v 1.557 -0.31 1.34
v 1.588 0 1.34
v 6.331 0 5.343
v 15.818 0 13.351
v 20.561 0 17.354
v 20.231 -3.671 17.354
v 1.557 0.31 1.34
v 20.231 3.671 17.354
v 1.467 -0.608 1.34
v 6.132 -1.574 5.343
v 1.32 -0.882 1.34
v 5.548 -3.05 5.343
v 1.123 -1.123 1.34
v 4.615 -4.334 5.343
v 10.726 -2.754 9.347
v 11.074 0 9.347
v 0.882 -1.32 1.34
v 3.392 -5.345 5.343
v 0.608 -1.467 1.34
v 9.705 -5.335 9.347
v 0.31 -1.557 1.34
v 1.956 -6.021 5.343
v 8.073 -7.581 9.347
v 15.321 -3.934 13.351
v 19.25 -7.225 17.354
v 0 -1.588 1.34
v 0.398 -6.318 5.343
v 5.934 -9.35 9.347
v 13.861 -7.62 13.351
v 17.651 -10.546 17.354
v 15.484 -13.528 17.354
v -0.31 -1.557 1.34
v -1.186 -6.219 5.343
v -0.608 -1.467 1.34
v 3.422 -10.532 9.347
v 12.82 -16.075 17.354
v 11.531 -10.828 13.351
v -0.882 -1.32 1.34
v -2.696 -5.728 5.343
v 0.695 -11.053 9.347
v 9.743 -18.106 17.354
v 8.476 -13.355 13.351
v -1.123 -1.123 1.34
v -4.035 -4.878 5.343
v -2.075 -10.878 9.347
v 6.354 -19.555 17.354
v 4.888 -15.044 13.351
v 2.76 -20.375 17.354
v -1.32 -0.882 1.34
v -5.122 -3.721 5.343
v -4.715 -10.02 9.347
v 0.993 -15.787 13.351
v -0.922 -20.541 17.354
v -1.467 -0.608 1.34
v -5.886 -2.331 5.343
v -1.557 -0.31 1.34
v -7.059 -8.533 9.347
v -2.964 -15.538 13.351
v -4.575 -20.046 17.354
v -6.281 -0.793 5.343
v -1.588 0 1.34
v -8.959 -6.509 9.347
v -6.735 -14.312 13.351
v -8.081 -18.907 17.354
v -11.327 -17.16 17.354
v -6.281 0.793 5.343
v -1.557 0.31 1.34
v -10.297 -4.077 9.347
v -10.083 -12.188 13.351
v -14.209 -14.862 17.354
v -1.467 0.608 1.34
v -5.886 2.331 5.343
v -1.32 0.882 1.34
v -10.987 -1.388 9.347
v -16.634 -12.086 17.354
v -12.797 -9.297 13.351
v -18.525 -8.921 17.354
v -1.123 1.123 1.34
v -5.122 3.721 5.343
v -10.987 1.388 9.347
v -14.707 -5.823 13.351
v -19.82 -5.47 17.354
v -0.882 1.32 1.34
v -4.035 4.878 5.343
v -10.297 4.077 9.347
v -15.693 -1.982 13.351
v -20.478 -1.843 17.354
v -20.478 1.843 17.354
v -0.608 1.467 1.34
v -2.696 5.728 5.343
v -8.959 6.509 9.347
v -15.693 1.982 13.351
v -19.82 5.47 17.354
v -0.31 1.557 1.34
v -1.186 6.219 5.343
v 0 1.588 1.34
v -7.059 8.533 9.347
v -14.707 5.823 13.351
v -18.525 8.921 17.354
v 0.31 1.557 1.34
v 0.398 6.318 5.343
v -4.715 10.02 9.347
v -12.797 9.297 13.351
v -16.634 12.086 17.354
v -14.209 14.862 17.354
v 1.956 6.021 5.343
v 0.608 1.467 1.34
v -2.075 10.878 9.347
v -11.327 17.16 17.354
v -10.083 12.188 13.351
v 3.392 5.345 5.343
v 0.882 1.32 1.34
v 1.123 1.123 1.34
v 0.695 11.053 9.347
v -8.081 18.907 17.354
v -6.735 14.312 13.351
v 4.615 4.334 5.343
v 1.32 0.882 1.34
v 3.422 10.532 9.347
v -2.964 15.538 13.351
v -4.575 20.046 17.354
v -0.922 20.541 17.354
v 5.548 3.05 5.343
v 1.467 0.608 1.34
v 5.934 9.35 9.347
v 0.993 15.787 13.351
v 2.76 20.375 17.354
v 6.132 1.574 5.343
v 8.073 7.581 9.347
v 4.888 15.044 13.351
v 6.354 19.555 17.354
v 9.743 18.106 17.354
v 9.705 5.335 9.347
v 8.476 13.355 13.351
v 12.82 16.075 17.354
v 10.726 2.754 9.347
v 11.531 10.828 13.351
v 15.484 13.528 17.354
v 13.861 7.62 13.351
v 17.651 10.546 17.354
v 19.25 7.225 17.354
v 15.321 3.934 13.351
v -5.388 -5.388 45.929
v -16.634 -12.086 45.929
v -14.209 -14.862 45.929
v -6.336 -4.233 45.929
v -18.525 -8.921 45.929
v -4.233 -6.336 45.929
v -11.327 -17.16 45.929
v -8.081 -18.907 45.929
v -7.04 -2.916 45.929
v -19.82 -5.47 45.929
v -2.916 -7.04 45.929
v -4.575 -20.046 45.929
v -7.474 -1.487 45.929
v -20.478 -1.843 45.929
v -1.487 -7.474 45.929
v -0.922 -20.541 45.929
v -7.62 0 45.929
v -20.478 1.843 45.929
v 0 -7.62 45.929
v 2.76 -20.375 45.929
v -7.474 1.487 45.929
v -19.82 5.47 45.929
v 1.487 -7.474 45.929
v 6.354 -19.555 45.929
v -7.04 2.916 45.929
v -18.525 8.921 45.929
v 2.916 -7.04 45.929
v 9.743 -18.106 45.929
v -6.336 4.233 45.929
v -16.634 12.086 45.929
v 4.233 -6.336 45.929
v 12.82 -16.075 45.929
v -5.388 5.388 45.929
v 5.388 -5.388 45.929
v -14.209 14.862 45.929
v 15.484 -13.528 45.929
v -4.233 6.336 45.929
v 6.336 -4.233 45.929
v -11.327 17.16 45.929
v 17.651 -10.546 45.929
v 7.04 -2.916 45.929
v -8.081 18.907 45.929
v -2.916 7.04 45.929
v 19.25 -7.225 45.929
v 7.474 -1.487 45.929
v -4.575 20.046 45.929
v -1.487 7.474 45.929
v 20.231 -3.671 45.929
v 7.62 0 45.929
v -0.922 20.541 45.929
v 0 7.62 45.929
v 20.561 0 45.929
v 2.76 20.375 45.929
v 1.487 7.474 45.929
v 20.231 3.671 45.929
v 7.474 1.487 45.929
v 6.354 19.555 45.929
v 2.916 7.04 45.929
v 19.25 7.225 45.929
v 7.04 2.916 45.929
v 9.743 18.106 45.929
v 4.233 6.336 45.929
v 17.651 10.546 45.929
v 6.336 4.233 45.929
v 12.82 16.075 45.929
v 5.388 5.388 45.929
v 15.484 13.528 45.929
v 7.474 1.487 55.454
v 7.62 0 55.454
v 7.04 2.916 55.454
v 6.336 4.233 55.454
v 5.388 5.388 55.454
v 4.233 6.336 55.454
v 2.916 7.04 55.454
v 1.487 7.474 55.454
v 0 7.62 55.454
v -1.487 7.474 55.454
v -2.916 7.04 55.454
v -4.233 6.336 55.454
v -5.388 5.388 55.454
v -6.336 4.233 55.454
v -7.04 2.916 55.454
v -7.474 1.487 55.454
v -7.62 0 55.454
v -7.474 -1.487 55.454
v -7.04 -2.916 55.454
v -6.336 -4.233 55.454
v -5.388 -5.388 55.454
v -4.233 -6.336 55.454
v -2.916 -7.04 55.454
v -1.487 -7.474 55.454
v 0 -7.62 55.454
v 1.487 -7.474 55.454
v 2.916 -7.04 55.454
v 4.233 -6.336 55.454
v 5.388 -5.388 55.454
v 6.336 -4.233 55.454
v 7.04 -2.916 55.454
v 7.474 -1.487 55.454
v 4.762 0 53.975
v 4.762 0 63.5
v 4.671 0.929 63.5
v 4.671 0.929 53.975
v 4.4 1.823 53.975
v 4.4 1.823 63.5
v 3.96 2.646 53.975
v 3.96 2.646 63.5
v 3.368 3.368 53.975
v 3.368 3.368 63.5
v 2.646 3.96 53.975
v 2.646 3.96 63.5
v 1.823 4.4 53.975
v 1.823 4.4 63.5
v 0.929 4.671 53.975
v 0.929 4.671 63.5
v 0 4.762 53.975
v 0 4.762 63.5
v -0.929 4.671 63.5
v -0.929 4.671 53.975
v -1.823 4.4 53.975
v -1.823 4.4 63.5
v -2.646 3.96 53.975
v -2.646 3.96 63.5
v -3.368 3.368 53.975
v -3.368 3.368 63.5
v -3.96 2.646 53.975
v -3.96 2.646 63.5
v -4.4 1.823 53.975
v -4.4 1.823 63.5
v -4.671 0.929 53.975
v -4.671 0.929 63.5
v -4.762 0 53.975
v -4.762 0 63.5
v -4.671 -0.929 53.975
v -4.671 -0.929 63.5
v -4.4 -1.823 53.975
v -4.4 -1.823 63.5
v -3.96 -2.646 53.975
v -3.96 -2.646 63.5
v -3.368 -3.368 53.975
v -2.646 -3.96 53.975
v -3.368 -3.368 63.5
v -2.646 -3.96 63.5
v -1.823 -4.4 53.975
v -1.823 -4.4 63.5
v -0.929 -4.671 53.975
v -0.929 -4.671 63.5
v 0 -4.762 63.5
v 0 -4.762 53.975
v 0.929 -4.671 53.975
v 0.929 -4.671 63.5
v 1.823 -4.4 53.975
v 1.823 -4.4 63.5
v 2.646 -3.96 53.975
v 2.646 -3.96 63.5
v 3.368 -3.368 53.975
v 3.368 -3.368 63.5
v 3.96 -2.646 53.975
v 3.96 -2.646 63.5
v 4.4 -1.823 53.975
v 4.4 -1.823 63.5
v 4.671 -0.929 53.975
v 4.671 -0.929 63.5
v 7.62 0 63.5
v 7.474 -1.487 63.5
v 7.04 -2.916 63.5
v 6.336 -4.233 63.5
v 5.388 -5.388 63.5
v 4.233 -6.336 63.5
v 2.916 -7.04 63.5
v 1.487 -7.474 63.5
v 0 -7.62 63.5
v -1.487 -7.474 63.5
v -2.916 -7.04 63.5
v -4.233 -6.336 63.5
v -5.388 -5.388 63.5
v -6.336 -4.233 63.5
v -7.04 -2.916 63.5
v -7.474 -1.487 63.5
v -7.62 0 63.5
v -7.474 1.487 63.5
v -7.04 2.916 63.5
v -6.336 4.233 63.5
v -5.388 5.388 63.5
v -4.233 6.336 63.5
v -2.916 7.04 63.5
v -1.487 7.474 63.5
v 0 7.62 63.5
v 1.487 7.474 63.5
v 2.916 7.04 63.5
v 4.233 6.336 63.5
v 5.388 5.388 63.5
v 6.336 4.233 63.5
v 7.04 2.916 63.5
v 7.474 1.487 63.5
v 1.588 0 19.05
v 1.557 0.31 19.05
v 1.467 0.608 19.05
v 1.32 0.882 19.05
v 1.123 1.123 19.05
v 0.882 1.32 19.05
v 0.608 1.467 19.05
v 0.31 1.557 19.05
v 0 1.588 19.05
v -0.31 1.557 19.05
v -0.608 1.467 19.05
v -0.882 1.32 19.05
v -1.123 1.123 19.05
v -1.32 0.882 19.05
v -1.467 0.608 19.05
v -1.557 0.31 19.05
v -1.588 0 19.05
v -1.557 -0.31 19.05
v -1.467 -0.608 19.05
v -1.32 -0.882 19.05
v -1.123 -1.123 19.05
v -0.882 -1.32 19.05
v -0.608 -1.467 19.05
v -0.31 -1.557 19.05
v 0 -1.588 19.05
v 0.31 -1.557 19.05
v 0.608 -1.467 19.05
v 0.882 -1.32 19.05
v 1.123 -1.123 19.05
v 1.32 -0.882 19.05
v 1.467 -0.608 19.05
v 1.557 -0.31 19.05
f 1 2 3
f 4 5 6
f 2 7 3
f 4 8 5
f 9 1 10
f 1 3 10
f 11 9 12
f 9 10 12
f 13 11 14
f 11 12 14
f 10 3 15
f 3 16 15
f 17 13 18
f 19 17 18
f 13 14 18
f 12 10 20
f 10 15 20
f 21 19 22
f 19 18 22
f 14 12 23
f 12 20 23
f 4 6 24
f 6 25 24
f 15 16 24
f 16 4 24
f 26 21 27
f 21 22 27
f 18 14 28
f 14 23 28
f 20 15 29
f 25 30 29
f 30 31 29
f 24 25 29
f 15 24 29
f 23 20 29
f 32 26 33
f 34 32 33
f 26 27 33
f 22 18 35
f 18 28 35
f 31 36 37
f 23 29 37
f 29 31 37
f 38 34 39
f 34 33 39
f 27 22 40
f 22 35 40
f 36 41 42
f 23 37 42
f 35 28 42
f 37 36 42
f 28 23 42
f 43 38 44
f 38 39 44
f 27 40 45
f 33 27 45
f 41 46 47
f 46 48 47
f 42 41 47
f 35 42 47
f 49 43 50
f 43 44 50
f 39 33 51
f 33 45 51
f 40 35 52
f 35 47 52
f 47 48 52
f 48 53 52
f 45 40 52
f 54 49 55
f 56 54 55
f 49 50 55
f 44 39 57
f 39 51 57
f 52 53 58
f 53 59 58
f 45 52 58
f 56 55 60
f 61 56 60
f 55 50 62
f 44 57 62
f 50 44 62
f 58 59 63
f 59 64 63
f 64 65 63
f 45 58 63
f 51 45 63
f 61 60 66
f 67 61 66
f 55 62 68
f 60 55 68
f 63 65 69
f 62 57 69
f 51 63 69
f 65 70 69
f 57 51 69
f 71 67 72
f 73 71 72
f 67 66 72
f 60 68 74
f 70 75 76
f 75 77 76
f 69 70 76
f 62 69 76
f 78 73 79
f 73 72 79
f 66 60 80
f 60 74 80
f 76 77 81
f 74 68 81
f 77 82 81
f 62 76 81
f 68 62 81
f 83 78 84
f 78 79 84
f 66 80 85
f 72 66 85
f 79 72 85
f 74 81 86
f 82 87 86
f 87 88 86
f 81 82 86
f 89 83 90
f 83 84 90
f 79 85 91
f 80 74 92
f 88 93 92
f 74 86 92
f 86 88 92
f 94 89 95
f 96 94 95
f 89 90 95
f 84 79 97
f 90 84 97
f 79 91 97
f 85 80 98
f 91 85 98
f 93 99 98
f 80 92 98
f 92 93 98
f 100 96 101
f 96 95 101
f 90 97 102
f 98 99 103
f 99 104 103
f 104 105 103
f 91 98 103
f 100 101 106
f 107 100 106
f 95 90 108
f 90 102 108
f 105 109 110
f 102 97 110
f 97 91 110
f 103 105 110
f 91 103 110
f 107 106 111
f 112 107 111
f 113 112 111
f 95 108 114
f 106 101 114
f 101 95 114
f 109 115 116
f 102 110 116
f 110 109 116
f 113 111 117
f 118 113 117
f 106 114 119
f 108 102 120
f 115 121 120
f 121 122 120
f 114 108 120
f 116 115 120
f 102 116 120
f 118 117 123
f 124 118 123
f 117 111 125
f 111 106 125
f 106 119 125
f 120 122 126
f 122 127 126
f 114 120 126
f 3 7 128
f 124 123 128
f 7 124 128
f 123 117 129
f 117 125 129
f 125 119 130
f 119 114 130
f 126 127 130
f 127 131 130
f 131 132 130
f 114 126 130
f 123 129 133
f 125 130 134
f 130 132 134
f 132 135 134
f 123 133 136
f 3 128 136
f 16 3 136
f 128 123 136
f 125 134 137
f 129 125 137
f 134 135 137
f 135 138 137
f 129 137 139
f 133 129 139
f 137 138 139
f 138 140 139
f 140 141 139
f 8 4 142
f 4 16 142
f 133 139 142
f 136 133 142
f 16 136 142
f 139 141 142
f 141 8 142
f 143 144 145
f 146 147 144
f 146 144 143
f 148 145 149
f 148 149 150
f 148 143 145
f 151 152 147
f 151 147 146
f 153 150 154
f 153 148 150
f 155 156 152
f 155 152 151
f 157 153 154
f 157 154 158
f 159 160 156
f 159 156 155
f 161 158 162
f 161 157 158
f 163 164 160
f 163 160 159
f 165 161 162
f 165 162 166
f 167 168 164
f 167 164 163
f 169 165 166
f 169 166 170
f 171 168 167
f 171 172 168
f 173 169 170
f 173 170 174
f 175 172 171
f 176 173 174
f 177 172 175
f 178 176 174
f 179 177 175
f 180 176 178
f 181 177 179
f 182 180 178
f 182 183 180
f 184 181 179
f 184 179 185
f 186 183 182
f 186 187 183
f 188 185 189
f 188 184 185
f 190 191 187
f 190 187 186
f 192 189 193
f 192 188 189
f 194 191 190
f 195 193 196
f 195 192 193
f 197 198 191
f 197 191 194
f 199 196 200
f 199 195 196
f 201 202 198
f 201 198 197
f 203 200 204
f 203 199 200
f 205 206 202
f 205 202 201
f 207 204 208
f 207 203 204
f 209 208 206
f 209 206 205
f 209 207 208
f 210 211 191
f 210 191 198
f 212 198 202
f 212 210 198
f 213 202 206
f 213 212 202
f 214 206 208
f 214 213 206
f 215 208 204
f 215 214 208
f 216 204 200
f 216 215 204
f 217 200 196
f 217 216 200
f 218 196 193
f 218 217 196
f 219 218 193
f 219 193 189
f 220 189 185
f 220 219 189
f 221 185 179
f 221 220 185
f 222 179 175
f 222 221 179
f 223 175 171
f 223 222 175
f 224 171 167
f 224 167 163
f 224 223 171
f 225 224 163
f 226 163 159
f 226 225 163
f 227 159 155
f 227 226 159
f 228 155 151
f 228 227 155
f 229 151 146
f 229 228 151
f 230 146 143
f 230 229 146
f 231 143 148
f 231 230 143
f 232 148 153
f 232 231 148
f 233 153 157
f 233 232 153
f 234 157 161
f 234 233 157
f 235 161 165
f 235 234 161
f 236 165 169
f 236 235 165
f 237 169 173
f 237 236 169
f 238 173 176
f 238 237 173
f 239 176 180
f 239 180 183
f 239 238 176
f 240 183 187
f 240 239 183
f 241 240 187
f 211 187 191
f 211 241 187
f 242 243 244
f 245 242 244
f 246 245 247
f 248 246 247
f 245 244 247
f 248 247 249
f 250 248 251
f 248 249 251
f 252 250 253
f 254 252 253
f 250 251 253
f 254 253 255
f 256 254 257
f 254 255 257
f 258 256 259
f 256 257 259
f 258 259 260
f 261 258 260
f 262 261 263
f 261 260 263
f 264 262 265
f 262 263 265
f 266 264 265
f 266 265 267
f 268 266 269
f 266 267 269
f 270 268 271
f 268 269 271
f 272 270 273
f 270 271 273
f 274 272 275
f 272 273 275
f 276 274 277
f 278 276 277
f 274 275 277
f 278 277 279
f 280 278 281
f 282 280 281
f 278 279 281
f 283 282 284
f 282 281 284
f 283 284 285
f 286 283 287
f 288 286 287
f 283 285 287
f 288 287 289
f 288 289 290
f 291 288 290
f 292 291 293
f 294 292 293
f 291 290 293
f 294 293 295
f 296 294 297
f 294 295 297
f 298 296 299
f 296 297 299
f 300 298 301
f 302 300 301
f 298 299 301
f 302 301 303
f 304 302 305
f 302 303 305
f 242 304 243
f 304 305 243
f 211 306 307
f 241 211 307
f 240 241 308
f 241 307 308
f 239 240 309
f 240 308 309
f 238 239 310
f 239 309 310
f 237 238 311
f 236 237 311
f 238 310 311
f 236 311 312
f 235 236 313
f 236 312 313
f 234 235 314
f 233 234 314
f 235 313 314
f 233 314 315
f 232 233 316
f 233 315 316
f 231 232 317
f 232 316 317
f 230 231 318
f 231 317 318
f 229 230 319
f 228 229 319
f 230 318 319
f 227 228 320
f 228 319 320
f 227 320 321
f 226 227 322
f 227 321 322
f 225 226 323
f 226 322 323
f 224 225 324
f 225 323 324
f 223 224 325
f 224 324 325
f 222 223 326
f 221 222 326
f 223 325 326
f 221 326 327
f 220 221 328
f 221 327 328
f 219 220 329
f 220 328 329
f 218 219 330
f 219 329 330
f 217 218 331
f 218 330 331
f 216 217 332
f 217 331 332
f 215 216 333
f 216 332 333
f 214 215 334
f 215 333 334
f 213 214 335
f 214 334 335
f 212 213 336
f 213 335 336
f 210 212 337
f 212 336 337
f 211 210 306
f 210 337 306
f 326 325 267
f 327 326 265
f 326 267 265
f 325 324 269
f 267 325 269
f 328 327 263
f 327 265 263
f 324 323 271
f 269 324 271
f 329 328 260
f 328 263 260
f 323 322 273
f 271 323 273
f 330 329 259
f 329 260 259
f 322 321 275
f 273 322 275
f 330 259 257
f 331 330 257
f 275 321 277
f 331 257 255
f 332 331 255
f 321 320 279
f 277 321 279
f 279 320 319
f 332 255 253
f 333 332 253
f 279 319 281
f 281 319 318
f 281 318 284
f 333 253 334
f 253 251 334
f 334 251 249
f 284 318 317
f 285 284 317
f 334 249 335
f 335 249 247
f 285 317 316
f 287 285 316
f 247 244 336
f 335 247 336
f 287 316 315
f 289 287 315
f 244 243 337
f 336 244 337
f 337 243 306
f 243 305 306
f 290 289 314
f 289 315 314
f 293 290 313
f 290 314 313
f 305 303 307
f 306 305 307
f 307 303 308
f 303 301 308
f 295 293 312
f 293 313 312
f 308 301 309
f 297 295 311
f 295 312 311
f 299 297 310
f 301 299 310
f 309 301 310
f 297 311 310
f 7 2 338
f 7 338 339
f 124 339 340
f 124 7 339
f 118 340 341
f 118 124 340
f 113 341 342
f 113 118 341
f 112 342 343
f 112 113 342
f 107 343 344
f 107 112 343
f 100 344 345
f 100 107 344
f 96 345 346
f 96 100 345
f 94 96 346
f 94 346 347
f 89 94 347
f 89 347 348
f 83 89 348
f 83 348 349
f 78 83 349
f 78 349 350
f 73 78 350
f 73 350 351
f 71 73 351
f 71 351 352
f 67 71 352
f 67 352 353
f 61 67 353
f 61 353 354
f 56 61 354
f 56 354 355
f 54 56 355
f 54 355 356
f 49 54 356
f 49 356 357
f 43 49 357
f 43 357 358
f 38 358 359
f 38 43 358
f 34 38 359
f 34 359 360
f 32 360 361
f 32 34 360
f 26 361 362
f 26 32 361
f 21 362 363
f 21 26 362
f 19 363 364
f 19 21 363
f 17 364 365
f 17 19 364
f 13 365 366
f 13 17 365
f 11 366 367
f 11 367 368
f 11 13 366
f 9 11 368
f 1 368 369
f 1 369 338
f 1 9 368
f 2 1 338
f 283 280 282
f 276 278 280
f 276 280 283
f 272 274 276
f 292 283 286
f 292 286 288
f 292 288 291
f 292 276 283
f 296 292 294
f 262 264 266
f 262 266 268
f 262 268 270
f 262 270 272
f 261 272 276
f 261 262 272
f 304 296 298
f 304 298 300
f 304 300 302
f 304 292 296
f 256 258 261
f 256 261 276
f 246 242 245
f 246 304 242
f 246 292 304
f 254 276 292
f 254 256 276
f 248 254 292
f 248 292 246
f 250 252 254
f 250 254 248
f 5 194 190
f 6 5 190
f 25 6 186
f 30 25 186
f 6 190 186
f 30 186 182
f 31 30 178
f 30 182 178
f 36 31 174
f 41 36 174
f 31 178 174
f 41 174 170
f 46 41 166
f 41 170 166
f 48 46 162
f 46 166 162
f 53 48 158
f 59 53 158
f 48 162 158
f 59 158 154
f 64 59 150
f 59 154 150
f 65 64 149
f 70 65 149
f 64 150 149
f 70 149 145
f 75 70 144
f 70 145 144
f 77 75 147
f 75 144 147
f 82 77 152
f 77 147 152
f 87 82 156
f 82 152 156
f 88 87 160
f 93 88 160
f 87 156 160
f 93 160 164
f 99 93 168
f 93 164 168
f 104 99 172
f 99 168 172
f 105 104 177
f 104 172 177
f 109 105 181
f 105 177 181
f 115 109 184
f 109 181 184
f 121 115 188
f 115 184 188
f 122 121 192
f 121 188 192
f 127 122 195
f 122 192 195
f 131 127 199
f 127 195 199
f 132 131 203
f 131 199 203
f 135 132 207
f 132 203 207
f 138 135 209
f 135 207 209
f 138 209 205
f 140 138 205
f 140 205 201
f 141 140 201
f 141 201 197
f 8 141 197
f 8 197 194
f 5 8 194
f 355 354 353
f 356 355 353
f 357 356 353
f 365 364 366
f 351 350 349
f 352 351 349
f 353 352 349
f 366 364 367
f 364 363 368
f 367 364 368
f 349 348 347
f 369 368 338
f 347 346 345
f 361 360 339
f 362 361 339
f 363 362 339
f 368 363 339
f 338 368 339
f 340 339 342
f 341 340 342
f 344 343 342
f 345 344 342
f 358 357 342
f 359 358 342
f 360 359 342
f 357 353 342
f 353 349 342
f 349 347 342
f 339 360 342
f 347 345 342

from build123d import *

# Parameters (mm, degrees)
F2_R         = 4.7625
F1_FACE1_R   = 20.5612294376
F1_FACE1_R_2 = 7.62
F3_DEPTH     = 9.525
F4_R         = 1.5875
F5_DEPTH     = 19.05


with BuildPart() as f1:
    # F0 (on Front) → F1 (revolve)
    with BuildSketch(Plane.XZ):
        Polygon((0, 63.5), (0, 0), (20.5612294376, 17.3543042779), (20.5612294376, 55.4543042779), (7.62, 55.4543042779), (7.62, 63.5), align=None)
    revolve(axis=Axis((0, 0, 31.75), (0, 0, -1)))

    # F2 (on face) + F1_face1 (on face) → F3 (cut)
    with BuildSketch(Plane.XY.offset(63.5)):
        Circle(F2_R)
    with BuildSketch(Plane.XY.offset(55.4543042779)):
        Circle(F1_FACE1_R)
        Circle(F1_FACE1_R_2, mode=Mode.SUBTRACT)
    extrude(amount=-F3_DEPTH, mode=Mode.SUBTRACT)

    # F4 (on Top) → F5 (cut)
    with BuildSketch(Plane.XY):
        Circle(F4_R)
    extrude(amount=F5_DEPTH, mode=Mode.SUBTRACT)


solid = f1.part
